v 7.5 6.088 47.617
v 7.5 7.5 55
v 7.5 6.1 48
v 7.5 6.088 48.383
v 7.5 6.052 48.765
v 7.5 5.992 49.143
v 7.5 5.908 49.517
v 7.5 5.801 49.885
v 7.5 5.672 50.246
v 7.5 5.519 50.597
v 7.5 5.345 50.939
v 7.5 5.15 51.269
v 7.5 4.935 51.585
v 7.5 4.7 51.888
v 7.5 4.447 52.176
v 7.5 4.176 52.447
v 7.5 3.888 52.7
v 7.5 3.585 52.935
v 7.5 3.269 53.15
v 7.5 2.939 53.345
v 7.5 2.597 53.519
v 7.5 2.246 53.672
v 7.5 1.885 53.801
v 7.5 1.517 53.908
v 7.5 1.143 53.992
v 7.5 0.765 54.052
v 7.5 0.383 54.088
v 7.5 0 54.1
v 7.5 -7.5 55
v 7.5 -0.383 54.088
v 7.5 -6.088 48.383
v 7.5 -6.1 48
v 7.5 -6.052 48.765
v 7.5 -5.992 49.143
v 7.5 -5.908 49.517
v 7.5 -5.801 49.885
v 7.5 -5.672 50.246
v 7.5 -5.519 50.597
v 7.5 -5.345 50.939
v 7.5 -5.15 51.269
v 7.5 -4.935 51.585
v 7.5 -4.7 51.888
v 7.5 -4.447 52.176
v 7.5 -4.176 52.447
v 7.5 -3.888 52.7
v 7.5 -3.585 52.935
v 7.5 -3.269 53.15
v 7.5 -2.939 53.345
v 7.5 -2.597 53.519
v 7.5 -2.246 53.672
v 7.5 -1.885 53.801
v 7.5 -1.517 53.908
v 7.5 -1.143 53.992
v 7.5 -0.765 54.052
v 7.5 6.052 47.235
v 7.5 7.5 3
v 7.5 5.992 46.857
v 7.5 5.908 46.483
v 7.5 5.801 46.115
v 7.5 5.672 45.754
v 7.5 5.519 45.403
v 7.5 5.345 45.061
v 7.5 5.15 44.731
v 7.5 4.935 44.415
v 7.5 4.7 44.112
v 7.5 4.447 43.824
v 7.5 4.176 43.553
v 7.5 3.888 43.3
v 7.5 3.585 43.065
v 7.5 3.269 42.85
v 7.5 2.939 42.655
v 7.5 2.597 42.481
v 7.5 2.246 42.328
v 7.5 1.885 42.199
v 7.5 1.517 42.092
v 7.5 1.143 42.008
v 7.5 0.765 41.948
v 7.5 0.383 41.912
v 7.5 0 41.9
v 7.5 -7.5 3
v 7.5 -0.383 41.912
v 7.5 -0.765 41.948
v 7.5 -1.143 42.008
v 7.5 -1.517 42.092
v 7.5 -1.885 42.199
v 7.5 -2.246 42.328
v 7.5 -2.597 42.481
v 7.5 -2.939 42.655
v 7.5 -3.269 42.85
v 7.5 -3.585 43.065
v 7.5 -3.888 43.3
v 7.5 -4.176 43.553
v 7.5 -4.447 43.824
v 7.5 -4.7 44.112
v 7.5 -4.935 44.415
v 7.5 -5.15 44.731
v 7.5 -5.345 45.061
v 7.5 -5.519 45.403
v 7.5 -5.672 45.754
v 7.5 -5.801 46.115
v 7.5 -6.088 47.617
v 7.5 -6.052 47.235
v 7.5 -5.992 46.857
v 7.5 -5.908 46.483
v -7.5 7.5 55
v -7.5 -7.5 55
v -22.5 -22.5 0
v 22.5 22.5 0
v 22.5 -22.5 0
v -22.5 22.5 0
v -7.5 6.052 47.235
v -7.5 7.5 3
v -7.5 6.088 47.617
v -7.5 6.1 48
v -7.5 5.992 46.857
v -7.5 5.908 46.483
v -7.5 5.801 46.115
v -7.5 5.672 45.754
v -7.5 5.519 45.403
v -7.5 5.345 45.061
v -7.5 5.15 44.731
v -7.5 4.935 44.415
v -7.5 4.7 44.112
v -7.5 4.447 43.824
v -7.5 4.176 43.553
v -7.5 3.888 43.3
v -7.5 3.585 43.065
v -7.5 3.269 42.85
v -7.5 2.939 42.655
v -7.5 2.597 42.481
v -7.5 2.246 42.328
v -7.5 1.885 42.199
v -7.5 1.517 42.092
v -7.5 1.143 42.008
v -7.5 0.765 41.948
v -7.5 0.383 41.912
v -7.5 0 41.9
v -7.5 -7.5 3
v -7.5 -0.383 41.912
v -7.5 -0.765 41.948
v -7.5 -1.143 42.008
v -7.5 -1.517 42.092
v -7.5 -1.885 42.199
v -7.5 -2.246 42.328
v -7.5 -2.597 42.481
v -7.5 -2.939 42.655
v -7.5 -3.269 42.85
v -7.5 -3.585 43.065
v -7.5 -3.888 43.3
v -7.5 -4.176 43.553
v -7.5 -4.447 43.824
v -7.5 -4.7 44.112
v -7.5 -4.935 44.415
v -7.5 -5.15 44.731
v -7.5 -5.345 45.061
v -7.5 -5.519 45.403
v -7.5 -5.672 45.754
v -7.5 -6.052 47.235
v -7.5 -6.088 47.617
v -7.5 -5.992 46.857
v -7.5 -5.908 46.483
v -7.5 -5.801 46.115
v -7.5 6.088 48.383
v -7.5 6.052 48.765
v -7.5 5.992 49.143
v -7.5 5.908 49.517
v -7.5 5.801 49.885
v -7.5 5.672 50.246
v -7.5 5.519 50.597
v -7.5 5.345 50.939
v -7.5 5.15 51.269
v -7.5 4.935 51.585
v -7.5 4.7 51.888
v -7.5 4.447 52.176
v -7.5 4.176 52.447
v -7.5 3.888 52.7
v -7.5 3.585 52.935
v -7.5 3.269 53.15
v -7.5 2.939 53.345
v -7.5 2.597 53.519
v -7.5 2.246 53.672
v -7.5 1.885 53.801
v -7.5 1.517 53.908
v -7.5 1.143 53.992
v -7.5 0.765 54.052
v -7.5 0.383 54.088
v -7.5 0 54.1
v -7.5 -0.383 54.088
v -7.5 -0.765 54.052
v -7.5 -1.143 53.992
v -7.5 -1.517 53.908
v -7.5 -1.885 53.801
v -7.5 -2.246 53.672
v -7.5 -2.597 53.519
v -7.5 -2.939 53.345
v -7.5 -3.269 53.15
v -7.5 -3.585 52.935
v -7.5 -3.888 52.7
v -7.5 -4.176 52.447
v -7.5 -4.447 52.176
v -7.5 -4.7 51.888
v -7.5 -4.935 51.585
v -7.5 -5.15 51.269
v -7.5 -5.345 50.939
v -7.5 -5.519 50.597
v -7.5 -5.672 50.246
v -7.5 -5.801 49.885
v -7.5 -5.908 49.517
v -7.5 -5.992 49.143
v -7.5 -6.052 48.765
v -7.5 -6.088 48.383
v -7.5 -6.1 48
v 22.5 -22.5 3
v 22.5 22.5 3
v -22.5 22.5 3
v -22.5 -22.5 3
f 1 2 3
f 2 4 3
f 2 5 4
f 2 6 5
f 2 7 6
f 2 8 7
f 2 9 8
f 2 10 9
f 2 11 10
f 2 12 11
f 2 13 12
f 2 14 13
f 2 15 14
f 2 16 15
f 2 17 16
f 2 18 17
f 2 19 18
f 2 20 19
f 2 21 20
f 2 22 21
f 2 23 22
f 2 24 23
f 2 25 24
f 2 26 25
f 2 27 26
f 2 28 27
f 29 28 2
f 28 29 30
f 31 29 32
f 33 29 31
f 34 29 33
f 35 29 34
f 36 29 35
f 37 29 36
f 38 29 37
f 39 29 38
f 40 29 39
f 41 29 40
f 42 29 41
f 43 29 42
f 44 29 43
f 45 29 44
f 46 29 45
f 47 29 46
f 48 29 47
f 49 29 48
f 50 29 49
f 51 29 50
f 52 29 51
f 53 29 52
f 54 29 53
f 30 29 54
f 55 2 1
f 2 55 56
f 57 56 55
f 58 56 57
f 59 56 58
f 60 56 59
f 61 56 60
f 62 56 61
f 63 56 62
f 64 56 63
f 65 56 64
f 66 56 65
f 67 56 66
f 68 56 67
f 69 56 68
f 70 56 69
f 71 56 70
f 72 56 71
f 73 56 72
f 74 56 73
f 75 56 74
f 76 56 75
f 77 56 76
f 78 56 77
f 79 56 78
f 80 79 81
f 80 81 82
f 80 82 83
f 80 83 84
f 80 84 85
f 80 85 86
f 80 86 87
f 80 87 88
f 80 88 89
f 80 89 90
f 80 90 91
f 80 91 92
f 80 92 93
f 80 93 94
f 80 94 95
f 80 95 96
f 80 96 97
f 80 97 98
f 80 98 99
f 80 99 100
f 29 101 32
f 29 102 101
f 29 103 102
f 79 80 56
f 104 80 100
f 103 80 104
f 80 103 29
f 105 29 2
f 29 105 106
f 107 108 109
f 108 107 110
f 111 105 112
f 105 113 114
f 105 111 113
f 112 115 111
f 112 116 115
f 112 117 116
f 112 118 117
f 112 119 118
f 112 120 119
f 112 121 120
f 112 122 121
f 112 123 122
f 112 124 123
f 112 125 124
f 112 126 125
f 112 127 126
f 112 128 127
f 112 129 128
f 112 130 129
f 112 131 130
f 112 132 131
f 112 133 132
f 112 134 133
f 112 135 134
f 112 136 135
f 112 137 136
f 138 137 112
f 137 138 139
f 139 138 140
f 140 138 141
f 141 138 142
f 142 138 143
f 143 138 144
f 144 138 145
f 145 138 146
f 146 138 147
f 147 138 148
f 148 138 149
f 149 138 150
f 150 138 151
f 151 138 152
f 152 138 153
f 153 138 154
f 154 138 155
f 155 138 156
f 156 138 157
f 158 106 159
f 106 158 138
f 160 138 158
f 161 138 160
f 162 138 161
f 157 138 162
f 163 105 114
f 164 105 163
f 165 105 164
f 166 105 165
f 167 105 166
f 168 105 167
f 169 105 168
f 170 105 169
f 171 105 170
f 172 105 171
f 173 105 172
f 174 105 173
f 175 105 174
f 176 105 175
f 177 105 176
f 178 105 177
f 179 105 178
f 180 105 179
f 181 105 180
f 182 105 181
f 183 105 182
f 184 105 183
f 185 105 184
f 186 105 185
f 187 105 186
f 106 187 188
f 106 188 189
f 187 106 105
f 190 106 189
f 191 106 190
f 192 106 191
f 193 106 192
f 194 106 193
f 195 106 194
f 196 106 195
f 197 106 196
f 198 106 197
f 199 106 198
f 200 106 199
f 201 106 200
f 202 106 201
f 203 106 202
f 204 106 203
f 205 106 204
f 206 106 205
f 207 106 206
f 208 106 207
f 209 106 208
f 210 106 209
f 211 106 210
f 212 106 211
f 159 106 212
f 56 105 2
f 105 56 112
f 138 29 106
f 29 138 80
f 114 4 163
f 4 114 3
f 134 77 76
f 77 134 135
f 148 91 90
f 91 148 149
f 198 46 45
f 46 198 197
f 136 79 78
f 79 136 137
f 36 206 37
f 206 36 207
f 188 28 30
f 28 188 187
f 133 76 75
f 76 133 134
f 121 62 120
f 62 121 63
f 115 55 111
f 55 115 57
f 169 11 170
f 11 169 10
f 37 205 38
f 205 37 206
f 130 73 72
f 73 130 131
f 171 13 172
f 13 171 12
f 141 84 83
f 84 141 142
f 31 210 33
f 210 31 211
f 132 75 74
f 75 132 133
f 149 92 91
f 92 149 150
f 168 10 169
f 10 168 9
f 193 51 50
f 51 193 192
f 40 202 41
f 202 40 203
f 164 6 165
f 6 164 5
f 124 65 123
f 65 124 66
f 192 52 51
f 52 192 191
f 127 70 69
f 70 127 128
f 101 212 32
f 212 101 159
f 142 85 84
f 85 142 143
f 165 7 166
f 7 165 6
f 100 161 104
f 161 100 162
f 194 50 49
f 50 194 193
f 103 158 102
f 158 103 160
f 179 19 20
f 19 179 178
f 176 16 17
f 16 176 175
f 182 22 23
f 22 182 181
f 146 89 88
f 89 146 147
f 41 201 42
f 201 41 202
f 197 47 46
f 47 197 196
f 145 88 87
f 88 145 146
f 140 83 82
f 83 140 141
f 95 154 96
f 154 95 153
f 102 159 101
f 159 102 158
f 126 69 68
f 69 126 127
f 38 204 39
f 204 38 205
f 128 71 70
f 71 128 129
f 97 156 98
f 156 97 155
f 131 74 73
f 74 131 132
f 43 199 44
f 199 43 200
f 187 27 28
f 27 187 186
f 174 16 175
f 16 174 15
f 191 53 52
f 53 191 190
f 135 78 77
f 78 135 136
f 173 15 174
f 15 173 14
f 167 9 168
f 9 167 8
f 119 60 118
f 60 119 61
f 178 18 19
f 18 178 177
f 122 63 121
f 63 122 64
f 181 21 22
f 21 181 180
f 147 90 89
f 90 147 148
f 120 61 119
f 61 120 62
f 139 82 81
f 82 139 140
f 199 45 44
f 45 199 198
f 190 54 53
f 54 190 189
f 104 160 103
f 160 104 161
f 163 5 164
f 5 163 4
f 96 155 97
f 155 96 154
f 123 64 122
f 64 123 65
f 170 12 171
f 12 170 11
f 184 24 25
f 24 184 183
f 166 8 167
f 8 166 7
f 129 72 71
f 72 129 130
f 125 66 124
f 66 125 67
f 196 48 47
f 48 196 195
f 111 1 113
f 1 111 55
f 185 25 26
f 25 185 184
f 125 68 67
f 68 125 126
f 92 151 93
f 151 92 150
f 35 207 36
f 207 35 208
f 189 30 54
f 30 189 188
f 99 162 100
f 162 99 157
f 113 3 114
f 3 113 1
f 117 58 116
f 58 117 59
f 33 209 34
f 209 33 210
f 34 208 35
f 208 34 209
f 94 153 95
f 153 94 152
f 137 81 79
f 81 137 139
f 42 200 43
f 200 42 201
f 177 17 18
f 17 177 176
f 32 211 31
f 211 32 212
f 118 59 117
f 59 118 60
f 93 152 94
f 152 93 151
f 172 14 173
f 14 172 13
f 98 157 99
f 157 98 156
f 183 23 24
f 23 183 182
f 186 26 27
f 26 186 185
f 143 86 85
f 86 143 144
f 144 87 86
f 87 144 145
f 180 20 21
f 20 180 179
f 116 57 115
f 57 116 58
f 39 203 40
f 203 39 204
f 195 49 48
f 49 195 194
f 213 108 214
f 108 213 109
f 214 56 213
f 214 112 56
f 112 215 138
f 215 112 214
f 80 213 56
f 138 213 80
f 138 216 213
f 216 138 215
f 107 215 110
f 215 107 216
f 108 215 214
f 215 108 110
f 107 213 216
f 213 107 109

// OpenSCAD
$fn=100;

module laserHolder(x, y, z, d, h, fx, fy, fz){
	translate([0,0,z/2]){
		difference(){
			cube([x, y, z], center=true);
			translate([0,0,h-z/2]){
				rotate([0,90,0]){
					#cylinder(h=x, d=d, center=true);
				}
			}
		}
		translate([0,0,-z/2+fz/2]){
			cube([fx, fy, fz], center=true);
		}
	}
}

laserHolder(15, 15, 55, 12.2, 48, 45, 45, 3);
